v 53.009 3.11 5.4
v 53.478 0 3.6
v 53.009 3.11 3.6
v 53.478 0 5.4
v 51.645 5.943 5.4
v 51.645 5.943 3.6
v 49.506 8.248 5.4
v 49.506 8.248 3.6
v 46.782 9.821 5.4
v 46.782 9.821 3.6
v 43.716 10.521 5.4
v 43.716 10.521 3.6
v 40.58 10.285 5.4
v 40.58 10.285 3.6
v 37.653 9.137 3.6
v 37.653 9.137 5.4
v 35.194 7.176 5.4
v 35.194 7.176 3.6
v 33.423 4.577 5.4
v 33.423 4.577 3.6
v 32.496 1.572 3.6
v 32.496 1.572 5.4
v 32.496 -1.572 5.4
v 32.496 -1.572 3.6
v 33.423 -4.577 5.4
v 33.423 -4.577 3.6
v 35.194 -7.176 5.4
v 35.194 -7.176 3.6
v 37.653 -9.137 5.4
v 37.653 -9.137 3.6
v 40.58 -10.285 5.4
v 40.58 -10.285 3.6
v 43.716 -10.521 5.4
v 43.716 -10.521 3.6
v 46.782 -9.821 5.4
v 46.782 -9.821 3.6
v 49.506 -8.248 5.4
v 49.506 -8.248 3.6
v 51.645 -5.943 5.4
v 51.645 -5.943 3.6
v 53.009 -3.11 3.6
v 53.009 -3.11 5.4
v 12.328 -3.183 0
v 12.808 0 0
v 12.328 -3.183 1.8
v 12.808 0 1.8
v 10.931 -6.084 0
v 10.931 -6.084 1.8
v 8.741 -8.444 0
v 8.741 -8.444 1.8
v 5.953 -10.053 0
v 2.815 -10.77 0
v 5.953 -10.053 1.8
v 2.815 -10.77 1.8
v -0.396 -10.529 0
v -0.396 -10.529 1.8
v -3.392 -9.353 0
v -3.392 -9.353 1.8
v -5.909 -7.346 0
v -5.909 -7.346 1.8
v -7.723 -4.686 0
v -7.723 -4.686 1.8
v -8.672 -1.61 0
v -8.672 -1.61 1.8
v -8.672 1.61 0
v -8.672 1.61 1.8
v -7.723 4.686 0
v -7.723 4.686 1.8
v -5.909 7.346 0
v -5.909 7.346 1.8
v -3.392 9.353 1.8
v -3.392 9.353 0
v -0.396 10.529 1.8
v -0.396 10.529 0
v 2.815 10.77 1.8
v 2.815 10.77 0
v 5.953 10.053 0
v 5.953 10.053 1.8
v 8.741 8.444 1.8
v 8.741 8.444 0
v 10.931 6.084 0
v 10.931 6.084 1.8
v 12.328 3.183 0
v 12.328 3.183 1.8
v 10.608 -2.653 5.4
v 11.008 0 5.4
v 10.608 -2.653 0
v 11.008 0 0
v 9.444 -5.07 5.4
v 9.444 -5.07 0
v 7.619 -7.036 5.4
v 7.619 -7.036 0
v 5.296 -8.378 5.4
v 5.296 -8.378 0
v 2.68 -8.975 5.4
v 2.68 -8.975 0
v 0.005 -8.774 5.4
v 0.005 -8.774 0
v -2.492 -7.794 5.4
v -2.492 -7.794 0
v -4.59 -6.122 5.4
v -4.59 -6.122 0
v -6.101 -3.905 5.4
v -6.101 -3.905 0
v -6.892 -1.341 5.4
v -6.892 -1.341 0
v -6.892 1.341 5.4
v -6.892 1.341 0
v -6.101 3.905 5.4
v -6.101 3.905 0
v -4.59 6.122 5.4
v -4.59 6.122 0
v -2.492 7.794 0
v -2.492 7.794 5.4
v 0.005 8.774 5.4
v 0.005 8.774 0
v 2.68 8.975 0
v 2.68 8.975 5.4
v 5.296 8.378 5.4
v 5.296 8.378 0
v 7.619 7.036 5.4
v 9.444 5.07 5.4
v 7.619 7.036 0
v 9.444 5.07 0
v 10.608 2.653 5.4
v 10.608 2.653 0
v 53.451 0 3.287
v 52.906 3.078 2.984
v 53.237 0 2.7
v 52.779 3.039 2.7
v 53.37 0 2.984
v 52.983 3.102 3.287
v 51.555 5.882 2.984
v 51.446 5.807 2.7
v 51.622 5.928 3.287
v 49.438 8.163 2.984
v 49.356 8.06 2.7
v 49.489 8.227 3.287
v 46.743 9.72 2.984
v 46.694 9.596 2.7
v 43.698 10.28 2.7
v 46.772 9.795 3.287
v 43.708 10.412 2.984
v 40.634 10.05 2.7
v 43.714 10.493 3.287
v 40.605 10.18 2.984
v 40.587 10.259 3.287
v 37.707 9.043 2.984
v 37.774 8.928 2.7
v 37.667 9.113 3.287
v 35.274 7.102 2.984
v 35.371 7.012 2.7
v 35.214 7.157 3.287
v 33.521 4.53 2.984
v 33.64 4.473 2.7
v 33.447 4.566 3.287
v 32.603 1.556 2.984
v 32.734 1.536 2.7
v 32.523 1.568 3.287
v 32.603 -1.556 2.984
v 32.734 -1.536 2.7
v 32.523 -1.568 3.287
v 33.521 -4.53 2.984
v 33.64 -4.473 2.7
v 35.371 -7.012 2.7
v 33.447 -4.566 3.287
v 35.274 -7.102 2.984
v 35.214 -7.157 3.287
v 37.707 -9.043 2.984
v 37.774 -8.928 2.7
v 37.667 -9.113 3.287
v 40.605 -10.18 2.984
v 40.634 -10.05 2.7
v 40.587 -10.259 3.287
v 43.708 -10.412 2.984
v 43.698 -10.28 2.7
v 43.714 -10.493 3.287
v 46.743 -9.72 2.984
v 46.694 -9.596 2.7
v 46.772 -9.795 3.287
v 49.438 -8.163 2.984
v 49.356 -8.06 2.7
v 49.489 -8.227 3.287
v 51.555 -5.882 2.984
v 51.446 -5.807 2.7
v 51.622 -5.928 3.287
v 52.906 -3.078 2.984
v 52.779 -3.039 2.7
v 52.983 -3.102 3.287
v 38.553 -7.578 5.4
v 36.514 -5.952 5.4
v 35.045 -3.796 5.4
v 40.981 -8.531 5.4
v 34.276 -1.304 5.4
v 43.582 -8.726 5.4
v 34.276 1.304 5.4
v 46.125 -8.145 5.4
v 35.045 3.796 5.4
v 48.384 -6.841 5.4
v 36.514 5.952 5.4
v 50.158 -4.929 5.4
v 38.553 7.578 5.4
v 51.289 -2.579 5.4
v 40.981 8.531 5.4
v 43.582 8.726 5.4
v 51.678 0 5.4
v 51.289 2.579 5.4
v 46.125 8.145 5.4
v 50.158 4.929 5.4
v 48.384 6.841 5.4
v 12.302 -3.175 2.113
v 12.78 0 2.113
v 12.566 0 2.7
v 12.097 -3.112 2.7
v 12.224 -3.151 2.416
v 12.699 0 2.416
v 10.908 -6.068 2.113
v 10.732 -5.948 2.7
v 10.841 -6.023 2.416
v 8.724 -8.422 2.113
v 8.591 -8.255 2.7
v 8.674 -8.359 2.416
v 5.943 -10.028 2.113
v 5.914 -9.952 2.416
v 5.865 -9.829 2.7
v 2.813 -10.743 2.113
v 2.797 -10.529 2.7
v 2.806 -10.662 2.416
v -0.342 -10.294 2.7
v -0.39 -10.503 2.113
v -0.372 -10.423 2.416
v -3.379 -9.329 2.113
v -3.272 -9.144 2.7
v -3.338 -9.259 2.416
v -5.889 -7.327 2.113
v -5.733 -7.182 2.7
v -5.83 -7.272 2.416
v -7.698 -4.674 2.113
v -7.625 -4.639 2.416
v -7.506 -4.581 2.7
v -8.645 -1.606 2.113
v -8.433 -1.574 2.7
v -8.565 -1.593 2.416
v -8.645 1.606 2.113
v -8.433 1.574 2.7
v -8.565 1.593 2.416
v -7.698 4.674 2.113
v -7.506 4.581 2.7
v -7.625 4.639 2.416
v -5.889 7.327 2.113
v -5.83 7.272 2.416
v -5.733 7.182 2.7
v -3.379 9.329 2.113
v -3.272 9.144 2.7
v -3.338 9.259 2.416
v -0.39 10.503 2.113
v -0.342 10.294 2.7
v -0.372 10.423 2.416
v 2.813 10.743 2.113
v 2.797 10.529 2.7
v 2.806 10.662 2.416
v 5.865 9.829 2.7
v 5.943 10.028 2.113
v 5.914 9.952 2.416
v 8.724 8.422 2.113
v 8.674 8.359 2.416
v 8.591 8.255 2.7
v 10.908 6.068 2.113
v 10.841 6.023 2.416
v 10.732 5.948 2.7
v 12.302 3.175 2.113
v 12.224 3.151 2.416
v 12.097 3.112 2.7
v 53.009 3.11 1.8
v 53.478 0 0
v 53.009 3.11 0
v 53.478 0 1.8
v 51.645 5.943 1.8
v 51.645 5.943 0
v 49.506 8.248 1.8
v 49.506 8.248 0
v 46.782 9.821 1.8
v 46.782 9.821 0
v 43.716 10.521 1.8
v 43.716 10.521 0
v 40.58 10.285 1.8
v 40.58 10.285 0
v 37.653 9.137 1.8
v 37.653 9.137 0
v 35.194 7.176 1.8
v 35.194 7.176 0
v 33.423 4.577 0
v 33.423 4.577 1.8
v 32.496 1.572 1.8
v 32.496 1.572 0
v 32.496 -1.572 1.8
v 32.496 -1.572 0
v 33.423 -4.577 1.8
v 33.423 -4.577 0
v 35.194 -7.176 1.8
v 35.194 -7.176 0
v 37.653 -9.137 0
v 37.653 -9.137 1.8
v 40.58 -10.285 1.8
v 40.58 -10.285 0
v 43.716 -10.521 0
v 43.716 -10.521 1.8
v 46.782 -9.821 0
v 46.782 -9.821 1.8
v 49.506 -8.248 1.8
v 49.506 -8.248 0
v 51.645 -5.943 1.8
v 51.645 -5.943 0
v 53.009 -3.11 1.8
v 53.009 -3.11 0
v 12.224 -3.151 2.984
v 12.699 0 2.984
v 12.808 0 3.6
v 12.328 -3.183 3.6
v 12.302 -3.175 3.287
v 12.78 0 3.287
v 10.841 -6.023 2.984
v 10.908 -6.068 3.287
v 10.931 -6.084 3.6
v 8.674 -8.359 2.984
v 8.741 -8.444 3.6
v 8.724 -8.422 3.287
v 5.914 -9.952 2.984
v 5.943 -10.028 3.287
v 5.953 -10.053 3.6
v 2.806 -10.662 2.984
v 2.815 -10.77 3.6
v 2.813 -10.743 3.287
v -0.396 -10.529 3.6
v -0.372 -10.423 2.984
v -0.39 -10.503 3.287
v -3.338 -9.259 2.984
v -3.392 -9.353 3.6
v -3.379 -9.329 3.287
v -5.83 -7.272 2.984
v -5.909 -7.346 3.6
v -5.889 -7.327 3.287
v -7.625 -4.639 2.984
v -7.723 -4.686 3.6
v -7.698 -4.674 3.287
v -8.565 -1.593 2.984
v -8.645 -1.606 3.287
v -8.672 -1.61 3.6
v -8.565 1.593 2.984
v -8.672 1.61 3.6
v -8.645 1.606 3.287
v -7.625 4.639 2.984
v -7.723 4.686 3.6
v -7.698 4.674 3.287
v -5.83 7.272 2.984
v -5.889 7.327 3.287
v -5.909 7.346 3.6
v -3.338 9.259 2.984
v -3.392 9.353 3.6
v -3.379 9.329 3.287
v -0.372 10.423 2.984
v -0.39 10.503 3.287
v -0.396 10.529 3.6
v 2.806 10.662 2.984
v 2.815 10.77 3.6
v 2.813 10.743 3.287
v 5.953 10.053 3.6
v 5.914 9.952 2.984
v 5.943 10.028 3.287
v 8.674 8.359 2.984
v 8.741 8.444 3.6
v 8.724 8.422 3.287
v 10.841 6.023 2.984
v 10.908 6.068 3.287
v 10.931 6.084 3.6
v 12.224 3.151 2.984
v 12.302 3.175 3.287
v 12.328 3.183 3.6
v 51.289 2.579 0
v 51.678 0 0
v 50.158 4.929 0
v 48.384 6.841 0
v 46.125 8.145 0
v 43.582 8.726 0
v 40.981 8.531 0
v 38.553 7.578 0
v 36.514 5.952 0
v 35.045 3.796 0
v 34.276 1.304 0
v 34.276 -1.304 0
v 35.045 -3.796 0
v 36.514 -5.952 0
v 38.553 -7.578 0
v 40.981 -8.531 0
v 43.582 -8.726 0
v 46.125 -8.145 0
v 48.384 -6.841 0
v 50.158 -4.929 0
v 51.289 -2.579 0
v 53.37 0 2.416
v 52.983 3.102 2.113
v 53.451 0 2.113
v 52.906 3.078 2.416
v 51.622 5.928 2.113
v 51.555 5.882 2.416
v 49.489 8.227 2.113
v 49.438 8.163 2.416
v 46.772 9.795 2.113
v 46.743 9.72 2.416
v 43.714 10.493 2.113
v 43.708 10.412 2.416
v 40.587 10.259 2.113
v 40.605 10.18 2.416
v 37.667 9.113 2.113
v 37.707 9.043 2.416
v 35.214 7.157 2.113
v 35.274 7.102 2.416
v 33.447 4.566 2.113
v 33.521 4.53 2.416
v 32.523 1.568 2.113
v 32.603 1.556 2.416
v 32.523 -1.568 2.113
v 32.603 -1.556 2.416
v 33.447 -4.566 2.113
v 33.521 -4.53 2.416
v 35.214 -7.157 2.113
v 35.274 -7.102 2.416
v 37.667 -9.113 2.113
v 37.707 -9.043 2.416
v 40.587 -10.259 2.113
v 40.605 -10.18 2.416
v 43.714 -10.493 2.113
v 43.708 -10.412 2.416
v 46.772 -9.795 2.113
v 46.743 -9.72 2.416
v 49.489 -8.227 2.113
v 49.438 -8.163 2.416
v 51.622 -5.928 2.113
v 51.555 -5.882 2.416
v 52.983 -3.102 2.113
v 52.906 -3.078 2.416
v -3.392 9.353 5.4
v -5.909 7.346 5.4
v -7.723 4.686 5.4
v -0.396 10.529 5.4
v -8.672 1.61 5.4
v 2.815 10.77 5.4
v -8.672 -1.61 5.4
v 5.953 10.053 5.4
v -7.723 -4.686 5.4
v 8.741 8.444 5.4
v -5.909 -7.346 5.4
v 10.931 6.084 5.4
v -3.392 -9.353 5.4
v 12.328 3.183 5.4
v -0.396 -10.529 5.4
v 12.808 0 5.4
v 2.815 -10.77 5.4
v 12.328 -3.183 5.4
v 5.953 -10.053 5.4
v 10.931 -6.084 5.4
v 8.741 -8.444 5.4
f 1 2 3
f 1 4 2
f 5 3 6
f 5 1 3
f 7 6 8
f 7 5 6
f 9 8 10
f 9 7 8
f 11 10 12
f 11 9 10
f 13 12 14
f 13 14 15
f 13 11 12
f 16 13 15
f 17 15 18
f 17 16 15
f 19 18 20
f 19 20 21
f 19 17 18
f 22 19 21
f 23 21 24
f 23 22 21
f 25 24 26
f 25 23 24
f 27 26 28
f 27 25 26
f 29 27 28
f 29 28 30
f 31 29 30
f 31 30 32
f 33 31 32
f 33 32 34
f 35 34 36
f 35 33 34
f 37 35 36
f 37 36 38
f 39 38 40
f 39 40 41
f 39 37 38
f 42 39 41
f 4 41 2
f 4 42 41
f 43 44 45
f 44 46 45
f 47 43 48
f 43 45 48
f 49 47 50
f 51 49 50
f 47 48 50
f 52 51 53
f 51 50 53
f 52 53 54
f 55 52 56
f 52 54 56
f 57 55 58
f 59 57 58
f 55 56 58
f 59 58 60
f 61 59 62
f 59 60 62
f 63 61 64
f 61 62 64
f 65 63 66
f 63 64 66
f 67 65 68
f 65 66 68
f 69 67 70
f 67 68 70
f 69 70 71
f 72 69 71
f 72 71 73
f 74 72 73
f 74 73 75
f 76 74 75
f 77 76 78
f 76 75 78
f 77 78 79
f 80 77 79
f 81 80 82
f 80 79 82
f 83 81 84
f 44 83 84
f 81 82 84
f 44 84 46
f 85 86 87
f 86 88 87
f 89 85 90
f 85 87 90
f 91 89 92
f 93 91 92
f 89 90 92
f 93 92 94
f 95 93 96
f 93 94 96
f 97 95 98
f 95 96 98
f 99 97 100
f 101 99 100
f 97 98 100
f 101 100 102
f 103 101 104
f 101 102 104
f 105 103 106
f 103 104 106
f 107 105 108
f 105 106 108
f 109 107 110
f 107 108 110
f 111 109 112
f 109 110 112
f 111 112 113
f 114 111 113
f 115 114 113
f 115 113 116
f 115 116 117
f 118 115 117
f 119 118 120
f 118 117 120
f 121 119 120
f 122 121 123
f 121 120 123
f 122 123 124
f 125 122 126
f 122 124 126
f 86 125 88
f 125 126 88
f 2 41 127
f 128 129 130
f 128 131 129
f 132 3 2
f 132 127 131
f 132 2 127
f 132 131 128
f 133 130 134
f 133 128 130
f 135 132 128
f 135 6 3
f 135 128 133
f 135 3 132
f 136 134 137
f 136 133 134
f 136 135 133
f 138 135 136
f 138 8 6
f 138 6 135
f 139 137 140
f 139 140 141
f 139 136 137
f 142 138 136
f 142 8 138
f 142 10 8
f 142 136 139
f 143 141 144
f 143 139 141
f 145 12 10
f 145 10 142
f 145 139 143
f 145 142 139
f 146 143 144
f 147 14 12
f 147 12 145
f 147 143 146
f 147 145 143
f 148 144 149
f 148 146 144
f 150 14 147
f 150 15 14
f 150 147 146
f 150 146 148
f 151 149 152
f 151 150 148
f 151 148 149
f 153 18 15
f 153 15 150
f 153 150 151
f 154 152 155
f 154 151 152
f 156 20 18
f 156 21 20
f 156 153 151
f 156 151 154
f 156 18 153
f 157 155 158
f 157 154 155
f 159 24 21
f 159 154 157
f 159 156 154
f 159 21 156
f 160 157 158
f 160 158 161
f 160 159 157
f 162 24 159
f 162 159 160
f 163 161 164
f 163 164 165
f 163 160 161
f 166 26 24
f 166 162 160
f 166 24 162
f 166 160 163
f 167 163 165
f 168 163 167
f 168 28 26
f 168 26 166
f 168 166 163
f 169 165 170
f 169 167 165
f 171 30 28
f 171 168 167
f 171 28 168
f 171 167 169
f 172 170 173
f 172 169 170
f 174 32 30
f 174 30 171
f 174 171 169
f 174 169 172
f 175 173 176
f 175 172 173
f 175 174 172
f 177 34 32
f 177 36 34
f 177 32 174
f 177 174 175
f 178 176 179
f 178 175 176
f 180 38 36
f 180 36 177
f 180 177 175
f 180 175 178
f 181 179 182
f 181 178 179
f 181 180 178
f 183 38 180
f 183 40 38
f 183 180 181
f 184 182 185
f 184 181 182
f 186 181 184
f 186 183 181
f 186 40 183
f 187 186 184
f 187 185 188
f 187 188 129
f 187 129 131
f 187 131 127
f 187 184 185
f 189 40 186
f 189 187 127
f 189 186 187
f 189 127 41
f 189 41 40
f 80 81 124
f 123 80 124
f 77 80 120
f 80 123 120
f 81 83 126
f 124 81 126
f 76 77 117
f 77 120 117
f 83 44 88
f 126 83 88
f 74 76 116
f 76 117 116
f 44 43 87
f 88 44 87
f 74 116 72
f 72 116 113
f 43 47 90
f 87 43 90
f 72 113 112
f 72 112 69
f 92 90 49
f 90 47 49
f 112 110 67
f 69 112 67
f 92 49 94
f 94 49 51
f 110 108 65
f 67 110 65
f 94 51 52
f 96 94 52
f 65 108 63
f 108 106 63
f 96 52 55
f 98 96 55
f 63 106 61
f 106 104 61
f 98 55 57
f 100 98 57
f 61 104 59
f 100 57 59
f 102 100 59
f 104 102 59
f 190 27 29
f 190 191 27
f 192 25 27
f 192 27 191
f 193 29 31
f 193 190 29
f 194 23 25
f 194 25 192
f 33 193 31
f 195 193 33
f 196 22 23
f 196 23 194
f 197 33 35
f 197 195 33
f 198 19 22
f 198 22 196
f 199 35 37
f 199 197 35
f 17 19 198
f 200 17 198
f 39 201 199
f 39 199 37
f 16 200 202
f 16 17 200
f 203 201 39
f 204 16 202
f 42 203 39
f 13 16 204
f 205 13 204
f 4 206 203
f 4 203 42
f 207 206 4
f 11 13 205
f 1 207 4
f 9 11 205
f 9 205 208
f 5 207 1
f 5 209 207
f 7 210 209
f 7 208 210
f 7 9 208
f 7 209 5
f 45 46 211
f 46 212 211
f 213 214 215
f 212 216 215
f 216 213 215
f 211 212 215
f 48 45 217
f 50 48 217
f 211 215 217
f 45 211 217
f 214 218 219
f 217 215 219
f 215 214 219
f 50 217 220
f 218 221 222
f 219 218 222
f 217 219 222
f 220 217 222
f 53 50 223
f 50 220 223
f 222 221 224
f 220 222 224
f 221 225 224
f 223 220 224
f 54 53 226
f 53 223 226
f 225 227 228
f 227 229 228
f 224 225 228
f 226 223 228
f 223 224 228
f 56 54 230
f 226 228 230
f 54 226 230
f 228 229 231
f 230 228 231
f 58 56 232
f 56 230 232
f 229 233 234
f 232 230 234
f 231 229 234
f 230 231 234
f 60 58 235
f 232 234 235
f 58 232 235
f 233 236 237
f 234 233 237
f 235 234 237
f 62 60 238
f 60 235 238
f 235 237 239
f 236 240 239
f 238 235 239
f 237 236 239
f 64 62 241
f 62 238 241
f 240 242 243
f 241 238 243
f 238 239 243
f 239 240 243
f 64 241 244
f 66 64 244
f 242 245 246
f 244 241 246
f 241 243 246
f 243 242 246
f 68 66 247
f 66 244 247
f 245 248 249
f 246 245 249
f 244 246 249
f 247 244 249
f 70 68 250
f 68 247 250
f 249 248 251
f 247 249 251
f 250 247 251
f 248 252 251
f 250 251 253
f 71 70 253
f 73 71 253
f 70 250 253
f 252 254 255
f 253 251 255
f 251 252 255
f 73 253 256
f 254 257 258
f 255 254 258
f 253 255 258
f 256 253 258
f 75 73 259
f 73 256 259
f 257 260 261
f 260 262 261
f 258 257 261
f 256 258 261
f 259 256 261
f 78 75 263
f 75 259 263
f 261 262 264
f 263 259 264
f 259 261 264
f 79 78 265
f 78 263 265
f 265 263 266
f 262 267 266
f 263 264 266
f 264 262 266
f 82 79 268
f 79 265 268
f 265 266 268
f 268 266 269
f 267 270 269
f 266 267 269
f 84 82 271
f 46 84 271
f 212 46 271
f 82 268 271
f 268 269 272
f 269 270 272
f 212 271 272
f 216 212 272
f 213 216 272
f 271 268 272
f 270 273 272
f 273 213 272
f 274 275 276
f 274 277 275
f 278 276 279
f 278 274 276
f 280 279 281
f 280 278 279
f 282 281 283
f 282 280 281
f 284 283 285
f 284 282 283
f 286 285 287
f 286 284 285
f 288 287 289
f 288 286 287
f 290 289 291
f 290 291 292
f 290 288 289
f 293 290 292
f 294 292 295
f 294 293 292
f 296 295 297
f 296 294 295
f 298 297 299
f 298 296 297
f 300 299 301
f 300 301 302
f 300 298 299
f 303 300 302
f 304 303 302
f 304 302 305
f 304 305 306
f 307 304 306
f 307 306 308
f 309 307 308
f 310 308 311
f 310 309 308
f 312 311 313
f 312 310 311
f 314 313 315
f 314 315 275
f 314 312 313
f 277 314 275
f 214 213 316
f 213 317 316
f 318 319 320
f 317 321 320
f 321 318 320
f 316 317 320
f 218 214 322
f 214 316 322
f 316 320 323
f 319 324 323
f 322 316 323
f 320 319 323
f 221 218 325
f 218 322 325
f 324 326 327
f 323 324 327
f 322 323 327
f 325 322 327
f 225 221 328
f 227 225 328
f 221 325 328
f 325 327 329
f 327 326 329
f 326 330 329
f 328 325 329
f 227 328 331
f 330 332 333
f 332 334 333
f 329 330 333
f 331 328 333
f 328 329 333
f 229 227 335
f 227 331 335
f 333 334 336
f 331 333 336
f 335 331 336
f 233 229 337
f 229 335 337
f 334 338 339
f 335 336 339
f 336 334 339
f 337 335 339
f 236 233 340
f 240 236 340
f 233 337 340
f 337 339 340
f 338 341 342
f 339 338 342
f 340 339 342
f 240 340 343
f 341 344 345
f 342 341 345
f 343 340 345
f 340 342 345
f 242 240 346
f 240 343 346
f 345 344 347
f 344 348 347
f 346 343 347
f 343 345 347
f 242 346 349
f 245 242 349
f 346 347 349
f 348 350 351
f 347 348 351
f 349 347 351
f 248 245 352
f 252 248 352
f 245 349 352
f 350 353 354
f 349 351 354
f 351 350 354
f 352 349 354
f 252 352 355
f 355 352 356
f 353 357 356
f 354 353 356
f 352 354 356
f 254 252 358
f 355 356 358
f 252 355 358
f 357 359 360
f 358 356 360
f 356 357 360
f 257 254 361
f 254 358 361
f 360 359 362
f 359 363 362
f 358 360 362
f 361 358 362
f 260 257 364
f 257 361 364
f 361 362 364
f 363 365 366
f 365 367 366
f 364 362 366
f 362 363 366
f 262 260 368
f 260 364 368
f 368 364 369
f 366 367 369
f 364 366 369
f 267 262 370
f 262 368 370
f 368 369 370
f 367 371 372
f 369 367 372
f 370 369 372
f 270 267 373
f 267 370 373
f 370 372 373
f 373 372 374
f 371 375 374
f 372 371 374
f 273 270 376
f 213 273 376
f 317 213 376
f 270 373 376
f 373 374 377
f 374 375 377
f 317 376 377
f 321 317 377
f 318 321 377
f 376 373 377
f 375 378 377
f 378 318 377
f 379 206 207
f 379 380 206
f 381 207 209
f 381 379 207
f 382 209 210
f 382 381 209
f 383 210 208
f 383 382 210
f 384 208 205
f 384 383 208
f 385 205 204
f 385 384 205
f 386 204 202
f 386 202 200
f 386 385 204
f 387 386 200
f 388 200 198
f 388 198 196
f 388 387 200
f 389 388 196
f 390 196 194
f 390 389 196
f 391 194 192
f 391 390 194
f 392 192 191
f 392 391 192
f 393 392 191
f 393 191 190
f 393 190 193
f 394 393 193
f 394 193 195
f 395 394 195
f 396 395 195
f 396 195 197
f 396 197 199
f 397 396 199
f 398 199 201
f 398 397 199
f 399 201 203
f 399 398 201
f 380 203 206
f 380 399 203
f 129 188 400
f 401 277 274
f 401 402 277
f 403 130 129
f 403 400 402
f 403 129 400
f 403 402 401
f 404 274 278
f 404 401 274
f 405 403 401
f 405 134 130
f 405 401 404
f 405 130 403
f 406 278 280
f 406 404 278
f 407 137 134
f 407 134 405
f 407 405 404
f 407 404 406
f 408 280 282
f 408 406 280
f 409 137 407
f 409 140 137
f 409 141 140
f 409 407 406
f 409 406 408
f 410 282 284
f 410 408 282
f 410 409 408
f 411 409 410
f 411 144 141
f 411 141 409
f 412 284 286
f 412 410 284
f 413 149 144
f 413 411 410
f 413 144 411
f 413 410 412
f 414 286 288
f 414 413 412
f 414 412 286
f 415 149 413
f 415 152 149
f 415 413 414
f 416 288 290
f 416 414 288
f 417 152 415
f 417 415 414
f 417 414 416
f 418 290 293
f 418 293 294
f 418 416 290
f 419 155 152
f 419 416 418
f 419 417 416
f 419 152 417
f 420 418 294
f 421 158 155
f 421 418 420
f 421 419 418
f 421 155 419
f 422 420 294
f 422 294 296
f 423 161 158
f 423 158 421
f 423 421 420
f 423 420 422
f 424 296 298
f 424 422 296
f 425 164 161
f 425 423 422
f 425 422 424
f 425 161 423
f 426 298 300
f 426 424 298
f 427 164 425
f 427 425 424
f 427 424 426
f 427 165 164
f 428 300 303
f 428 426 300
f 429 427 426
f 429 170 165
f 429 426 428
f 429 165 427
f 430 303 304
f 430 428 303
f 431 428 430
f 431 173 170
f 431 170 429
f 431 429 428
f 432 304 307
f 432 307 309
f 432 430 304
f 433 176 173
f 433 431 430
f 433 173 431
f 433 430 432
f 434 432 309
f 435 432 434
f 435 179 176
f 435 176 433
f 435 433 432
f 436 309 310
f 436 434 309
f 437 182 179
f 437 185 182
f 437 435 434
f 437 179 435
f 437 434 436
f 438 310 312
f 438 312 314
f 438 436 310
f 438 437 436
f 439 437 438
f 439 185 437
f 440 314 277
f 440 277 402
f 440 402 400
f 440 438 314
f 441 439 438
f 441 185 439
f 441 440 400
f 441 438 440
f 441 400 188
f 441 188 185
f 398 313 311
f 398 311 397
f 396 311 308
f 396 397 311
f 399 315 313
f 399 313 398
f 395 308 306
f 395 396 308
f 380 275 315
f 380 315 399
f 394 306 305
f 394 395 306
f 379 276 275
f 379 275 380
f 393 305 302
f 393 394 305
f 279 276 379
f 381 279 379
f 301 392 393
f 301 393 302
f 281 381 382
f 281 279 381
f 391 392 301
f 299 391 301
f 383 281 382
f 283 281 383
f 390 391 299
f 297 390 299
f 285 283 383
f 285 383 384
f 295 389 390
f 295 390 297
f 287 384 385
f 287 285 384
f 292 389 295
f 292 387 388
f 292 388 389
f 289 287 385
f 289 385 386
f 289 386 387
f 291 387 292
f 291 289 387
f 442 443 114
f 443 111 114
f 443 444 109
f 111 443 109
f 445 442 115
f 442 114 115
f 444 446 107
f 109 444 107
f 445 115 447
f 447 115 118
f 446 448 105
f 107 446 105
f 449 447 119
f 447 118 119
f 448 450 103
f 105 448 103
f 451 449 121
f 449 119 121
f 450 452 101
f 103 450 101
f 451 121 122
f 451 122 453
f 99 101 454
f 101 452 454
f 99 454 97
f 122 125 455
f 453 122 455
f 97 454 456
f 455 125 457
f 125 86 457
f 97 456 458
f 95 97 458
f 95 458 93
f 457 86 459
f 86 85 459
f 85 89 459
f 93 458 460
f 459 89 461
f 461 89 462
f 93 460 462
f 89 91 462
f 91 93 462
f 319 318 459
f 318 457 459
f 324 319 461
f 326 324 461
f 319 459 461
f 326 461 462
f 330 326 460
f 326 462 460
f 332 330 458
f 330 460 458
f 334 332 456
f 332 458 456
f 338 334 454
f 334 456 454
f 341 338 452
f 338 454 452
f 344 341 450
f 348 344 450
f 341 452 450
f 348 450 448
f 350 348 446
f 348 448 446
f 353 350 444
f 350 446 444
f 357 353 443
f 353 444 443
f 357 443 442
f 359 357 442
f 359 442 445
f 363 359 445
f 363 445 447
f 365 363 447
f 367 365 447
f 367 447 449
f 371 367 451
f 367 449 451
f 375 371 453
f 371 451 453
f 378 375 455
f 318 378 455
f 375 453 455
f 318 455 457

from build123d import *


with BuildPart() as f1:
    # F0 (on Front) → F1 (revolve)
    with BuildSketch(Plane.XZ):
        with BuildLine():
            Line((11.0075026751, 1.8), (11.0075026751, 0))
            ThreePointArc((11.0075026751, 0), (12.2802948812, 0.5272077939), (12.8075026751, 1.8))
            ThreePointArc((12.8075026751, 1.8), (12.7461691624, 2.2658742812), (12.5663484019, 2.7))
            ThreePointArc((12.5663484019, 2.7), (11.9075026751, 2.0411542732), (11.0075026751, 1.8))
        make_face()
        with BuildLine():
            ThreePointArc((12.8075026751, 1.8), (12.2802948812, 0.5272077939), (11.0075026751, 0))
            Line((11.0075026751, 0), (12.8075026751, 0))
            Line((12.8075026751, 0), (12.8075026751, 1.8))
        make_face()
        with BuildLine():
            Line((11.0075026751, 2.7), (11.0075026751, 1.8))
            ThreePointArc((11.0075026751, 1.8), (11.9075026751, 2.0411542732), (12.5663484019, 2.7))
            ThreePointArc((12.5663484019, 2.7), (12.528210521, 2.7630408337), (12.4875246825, 2.8244680851))
            ThreePointArc((12.4875246825, 2.8244680851), (11.8429538845, 3.3943717498), (11.0075026751, 3.6))
            Line((11.0075026751, 3.6), (11.0075026751, 2.7))
        make_face()
        with BuildLine():
            ThreePointArc((12.4875246825, 2.8244680851), (12.528210521, 2.7630408337), (12.5663484019, 2.7))
            ThreePointArc((12.5663484019, 2.7), (12.7461691624, 3.1341257188), (12.8075026751, 3.6))
            Line((12.8075026751, 3.6), (12.8075026751, 5.4))
            Line((12.8075026751, 5.4), (11.0075026751, 5.4))
            Line((11.0075026751, 5.4), (11.0075026751, 3.6))
            ThreePointArc((11.0075026751, 3.6), (11.8429538845, 3.3943717498), (12.4875246825, 2.8244680851))
        make_face()
    revolve(axis=Axis((2.0075026751, 0, 2.4673056323), (0, 0, -1)))


with BuildPart() as f3:
    # F2 (on Front) → F3 (revolve)
    with BuildSketch(Plane.XZ):
        with BuildLine():
            Line((53.4780735552, 5.4), (51.6780735552, 5.4))
            Line((51.6780735552, 5.4), (51.6780735552, 3.6))
            ThreePointArc((51.6780735552, 3.6), (52.5780735552, 3.3588457268), (53.236919282, 2.7))
            ThreePointArc((53.236919282, 2.7), (53.4167400426, 3.1341257188), (53.4780735552, 3.6))
            Line((53.4780735552, 3.6), (53.4780735552, 5.4))
        make_face()
        with BuildLine():
            ThreePointArc((53.236919282, 2.7), (52.5780735552, 3.3588457268), (51.6780735552, 3.6))
            Line((51.6780735552, 3.6), (51.6780735552, 1.8))
            ThreePointArc((51.6780735552, 1.8), (52.5780735552, 2.0411542732), (53.236919282, 2.7))
        make_face()
        with BuildLine():
            ThreePointArc((53.236919282, 2.7), (52.5780735552, 2.0411542732), (51.6780735552, 1.8))
            Line((51.6780735552, 1.8), (51.6780735552, 0))
            Line((51.6780735552, 0), (53.4780735552, 0))
            Line((53.4780735552, 0), (53.4780735552, 1.8))
            ThreePointArc((53.4780735552, 1.8), (53.4167400426, 2.2658742812), (53.236919282, 2.7))
        make_face()
    revolve(axis=Axis((42.9280735552, 0, 5.6644450251), (0, 0, 1)))


solid = Compound([f1.part, f3.part])
